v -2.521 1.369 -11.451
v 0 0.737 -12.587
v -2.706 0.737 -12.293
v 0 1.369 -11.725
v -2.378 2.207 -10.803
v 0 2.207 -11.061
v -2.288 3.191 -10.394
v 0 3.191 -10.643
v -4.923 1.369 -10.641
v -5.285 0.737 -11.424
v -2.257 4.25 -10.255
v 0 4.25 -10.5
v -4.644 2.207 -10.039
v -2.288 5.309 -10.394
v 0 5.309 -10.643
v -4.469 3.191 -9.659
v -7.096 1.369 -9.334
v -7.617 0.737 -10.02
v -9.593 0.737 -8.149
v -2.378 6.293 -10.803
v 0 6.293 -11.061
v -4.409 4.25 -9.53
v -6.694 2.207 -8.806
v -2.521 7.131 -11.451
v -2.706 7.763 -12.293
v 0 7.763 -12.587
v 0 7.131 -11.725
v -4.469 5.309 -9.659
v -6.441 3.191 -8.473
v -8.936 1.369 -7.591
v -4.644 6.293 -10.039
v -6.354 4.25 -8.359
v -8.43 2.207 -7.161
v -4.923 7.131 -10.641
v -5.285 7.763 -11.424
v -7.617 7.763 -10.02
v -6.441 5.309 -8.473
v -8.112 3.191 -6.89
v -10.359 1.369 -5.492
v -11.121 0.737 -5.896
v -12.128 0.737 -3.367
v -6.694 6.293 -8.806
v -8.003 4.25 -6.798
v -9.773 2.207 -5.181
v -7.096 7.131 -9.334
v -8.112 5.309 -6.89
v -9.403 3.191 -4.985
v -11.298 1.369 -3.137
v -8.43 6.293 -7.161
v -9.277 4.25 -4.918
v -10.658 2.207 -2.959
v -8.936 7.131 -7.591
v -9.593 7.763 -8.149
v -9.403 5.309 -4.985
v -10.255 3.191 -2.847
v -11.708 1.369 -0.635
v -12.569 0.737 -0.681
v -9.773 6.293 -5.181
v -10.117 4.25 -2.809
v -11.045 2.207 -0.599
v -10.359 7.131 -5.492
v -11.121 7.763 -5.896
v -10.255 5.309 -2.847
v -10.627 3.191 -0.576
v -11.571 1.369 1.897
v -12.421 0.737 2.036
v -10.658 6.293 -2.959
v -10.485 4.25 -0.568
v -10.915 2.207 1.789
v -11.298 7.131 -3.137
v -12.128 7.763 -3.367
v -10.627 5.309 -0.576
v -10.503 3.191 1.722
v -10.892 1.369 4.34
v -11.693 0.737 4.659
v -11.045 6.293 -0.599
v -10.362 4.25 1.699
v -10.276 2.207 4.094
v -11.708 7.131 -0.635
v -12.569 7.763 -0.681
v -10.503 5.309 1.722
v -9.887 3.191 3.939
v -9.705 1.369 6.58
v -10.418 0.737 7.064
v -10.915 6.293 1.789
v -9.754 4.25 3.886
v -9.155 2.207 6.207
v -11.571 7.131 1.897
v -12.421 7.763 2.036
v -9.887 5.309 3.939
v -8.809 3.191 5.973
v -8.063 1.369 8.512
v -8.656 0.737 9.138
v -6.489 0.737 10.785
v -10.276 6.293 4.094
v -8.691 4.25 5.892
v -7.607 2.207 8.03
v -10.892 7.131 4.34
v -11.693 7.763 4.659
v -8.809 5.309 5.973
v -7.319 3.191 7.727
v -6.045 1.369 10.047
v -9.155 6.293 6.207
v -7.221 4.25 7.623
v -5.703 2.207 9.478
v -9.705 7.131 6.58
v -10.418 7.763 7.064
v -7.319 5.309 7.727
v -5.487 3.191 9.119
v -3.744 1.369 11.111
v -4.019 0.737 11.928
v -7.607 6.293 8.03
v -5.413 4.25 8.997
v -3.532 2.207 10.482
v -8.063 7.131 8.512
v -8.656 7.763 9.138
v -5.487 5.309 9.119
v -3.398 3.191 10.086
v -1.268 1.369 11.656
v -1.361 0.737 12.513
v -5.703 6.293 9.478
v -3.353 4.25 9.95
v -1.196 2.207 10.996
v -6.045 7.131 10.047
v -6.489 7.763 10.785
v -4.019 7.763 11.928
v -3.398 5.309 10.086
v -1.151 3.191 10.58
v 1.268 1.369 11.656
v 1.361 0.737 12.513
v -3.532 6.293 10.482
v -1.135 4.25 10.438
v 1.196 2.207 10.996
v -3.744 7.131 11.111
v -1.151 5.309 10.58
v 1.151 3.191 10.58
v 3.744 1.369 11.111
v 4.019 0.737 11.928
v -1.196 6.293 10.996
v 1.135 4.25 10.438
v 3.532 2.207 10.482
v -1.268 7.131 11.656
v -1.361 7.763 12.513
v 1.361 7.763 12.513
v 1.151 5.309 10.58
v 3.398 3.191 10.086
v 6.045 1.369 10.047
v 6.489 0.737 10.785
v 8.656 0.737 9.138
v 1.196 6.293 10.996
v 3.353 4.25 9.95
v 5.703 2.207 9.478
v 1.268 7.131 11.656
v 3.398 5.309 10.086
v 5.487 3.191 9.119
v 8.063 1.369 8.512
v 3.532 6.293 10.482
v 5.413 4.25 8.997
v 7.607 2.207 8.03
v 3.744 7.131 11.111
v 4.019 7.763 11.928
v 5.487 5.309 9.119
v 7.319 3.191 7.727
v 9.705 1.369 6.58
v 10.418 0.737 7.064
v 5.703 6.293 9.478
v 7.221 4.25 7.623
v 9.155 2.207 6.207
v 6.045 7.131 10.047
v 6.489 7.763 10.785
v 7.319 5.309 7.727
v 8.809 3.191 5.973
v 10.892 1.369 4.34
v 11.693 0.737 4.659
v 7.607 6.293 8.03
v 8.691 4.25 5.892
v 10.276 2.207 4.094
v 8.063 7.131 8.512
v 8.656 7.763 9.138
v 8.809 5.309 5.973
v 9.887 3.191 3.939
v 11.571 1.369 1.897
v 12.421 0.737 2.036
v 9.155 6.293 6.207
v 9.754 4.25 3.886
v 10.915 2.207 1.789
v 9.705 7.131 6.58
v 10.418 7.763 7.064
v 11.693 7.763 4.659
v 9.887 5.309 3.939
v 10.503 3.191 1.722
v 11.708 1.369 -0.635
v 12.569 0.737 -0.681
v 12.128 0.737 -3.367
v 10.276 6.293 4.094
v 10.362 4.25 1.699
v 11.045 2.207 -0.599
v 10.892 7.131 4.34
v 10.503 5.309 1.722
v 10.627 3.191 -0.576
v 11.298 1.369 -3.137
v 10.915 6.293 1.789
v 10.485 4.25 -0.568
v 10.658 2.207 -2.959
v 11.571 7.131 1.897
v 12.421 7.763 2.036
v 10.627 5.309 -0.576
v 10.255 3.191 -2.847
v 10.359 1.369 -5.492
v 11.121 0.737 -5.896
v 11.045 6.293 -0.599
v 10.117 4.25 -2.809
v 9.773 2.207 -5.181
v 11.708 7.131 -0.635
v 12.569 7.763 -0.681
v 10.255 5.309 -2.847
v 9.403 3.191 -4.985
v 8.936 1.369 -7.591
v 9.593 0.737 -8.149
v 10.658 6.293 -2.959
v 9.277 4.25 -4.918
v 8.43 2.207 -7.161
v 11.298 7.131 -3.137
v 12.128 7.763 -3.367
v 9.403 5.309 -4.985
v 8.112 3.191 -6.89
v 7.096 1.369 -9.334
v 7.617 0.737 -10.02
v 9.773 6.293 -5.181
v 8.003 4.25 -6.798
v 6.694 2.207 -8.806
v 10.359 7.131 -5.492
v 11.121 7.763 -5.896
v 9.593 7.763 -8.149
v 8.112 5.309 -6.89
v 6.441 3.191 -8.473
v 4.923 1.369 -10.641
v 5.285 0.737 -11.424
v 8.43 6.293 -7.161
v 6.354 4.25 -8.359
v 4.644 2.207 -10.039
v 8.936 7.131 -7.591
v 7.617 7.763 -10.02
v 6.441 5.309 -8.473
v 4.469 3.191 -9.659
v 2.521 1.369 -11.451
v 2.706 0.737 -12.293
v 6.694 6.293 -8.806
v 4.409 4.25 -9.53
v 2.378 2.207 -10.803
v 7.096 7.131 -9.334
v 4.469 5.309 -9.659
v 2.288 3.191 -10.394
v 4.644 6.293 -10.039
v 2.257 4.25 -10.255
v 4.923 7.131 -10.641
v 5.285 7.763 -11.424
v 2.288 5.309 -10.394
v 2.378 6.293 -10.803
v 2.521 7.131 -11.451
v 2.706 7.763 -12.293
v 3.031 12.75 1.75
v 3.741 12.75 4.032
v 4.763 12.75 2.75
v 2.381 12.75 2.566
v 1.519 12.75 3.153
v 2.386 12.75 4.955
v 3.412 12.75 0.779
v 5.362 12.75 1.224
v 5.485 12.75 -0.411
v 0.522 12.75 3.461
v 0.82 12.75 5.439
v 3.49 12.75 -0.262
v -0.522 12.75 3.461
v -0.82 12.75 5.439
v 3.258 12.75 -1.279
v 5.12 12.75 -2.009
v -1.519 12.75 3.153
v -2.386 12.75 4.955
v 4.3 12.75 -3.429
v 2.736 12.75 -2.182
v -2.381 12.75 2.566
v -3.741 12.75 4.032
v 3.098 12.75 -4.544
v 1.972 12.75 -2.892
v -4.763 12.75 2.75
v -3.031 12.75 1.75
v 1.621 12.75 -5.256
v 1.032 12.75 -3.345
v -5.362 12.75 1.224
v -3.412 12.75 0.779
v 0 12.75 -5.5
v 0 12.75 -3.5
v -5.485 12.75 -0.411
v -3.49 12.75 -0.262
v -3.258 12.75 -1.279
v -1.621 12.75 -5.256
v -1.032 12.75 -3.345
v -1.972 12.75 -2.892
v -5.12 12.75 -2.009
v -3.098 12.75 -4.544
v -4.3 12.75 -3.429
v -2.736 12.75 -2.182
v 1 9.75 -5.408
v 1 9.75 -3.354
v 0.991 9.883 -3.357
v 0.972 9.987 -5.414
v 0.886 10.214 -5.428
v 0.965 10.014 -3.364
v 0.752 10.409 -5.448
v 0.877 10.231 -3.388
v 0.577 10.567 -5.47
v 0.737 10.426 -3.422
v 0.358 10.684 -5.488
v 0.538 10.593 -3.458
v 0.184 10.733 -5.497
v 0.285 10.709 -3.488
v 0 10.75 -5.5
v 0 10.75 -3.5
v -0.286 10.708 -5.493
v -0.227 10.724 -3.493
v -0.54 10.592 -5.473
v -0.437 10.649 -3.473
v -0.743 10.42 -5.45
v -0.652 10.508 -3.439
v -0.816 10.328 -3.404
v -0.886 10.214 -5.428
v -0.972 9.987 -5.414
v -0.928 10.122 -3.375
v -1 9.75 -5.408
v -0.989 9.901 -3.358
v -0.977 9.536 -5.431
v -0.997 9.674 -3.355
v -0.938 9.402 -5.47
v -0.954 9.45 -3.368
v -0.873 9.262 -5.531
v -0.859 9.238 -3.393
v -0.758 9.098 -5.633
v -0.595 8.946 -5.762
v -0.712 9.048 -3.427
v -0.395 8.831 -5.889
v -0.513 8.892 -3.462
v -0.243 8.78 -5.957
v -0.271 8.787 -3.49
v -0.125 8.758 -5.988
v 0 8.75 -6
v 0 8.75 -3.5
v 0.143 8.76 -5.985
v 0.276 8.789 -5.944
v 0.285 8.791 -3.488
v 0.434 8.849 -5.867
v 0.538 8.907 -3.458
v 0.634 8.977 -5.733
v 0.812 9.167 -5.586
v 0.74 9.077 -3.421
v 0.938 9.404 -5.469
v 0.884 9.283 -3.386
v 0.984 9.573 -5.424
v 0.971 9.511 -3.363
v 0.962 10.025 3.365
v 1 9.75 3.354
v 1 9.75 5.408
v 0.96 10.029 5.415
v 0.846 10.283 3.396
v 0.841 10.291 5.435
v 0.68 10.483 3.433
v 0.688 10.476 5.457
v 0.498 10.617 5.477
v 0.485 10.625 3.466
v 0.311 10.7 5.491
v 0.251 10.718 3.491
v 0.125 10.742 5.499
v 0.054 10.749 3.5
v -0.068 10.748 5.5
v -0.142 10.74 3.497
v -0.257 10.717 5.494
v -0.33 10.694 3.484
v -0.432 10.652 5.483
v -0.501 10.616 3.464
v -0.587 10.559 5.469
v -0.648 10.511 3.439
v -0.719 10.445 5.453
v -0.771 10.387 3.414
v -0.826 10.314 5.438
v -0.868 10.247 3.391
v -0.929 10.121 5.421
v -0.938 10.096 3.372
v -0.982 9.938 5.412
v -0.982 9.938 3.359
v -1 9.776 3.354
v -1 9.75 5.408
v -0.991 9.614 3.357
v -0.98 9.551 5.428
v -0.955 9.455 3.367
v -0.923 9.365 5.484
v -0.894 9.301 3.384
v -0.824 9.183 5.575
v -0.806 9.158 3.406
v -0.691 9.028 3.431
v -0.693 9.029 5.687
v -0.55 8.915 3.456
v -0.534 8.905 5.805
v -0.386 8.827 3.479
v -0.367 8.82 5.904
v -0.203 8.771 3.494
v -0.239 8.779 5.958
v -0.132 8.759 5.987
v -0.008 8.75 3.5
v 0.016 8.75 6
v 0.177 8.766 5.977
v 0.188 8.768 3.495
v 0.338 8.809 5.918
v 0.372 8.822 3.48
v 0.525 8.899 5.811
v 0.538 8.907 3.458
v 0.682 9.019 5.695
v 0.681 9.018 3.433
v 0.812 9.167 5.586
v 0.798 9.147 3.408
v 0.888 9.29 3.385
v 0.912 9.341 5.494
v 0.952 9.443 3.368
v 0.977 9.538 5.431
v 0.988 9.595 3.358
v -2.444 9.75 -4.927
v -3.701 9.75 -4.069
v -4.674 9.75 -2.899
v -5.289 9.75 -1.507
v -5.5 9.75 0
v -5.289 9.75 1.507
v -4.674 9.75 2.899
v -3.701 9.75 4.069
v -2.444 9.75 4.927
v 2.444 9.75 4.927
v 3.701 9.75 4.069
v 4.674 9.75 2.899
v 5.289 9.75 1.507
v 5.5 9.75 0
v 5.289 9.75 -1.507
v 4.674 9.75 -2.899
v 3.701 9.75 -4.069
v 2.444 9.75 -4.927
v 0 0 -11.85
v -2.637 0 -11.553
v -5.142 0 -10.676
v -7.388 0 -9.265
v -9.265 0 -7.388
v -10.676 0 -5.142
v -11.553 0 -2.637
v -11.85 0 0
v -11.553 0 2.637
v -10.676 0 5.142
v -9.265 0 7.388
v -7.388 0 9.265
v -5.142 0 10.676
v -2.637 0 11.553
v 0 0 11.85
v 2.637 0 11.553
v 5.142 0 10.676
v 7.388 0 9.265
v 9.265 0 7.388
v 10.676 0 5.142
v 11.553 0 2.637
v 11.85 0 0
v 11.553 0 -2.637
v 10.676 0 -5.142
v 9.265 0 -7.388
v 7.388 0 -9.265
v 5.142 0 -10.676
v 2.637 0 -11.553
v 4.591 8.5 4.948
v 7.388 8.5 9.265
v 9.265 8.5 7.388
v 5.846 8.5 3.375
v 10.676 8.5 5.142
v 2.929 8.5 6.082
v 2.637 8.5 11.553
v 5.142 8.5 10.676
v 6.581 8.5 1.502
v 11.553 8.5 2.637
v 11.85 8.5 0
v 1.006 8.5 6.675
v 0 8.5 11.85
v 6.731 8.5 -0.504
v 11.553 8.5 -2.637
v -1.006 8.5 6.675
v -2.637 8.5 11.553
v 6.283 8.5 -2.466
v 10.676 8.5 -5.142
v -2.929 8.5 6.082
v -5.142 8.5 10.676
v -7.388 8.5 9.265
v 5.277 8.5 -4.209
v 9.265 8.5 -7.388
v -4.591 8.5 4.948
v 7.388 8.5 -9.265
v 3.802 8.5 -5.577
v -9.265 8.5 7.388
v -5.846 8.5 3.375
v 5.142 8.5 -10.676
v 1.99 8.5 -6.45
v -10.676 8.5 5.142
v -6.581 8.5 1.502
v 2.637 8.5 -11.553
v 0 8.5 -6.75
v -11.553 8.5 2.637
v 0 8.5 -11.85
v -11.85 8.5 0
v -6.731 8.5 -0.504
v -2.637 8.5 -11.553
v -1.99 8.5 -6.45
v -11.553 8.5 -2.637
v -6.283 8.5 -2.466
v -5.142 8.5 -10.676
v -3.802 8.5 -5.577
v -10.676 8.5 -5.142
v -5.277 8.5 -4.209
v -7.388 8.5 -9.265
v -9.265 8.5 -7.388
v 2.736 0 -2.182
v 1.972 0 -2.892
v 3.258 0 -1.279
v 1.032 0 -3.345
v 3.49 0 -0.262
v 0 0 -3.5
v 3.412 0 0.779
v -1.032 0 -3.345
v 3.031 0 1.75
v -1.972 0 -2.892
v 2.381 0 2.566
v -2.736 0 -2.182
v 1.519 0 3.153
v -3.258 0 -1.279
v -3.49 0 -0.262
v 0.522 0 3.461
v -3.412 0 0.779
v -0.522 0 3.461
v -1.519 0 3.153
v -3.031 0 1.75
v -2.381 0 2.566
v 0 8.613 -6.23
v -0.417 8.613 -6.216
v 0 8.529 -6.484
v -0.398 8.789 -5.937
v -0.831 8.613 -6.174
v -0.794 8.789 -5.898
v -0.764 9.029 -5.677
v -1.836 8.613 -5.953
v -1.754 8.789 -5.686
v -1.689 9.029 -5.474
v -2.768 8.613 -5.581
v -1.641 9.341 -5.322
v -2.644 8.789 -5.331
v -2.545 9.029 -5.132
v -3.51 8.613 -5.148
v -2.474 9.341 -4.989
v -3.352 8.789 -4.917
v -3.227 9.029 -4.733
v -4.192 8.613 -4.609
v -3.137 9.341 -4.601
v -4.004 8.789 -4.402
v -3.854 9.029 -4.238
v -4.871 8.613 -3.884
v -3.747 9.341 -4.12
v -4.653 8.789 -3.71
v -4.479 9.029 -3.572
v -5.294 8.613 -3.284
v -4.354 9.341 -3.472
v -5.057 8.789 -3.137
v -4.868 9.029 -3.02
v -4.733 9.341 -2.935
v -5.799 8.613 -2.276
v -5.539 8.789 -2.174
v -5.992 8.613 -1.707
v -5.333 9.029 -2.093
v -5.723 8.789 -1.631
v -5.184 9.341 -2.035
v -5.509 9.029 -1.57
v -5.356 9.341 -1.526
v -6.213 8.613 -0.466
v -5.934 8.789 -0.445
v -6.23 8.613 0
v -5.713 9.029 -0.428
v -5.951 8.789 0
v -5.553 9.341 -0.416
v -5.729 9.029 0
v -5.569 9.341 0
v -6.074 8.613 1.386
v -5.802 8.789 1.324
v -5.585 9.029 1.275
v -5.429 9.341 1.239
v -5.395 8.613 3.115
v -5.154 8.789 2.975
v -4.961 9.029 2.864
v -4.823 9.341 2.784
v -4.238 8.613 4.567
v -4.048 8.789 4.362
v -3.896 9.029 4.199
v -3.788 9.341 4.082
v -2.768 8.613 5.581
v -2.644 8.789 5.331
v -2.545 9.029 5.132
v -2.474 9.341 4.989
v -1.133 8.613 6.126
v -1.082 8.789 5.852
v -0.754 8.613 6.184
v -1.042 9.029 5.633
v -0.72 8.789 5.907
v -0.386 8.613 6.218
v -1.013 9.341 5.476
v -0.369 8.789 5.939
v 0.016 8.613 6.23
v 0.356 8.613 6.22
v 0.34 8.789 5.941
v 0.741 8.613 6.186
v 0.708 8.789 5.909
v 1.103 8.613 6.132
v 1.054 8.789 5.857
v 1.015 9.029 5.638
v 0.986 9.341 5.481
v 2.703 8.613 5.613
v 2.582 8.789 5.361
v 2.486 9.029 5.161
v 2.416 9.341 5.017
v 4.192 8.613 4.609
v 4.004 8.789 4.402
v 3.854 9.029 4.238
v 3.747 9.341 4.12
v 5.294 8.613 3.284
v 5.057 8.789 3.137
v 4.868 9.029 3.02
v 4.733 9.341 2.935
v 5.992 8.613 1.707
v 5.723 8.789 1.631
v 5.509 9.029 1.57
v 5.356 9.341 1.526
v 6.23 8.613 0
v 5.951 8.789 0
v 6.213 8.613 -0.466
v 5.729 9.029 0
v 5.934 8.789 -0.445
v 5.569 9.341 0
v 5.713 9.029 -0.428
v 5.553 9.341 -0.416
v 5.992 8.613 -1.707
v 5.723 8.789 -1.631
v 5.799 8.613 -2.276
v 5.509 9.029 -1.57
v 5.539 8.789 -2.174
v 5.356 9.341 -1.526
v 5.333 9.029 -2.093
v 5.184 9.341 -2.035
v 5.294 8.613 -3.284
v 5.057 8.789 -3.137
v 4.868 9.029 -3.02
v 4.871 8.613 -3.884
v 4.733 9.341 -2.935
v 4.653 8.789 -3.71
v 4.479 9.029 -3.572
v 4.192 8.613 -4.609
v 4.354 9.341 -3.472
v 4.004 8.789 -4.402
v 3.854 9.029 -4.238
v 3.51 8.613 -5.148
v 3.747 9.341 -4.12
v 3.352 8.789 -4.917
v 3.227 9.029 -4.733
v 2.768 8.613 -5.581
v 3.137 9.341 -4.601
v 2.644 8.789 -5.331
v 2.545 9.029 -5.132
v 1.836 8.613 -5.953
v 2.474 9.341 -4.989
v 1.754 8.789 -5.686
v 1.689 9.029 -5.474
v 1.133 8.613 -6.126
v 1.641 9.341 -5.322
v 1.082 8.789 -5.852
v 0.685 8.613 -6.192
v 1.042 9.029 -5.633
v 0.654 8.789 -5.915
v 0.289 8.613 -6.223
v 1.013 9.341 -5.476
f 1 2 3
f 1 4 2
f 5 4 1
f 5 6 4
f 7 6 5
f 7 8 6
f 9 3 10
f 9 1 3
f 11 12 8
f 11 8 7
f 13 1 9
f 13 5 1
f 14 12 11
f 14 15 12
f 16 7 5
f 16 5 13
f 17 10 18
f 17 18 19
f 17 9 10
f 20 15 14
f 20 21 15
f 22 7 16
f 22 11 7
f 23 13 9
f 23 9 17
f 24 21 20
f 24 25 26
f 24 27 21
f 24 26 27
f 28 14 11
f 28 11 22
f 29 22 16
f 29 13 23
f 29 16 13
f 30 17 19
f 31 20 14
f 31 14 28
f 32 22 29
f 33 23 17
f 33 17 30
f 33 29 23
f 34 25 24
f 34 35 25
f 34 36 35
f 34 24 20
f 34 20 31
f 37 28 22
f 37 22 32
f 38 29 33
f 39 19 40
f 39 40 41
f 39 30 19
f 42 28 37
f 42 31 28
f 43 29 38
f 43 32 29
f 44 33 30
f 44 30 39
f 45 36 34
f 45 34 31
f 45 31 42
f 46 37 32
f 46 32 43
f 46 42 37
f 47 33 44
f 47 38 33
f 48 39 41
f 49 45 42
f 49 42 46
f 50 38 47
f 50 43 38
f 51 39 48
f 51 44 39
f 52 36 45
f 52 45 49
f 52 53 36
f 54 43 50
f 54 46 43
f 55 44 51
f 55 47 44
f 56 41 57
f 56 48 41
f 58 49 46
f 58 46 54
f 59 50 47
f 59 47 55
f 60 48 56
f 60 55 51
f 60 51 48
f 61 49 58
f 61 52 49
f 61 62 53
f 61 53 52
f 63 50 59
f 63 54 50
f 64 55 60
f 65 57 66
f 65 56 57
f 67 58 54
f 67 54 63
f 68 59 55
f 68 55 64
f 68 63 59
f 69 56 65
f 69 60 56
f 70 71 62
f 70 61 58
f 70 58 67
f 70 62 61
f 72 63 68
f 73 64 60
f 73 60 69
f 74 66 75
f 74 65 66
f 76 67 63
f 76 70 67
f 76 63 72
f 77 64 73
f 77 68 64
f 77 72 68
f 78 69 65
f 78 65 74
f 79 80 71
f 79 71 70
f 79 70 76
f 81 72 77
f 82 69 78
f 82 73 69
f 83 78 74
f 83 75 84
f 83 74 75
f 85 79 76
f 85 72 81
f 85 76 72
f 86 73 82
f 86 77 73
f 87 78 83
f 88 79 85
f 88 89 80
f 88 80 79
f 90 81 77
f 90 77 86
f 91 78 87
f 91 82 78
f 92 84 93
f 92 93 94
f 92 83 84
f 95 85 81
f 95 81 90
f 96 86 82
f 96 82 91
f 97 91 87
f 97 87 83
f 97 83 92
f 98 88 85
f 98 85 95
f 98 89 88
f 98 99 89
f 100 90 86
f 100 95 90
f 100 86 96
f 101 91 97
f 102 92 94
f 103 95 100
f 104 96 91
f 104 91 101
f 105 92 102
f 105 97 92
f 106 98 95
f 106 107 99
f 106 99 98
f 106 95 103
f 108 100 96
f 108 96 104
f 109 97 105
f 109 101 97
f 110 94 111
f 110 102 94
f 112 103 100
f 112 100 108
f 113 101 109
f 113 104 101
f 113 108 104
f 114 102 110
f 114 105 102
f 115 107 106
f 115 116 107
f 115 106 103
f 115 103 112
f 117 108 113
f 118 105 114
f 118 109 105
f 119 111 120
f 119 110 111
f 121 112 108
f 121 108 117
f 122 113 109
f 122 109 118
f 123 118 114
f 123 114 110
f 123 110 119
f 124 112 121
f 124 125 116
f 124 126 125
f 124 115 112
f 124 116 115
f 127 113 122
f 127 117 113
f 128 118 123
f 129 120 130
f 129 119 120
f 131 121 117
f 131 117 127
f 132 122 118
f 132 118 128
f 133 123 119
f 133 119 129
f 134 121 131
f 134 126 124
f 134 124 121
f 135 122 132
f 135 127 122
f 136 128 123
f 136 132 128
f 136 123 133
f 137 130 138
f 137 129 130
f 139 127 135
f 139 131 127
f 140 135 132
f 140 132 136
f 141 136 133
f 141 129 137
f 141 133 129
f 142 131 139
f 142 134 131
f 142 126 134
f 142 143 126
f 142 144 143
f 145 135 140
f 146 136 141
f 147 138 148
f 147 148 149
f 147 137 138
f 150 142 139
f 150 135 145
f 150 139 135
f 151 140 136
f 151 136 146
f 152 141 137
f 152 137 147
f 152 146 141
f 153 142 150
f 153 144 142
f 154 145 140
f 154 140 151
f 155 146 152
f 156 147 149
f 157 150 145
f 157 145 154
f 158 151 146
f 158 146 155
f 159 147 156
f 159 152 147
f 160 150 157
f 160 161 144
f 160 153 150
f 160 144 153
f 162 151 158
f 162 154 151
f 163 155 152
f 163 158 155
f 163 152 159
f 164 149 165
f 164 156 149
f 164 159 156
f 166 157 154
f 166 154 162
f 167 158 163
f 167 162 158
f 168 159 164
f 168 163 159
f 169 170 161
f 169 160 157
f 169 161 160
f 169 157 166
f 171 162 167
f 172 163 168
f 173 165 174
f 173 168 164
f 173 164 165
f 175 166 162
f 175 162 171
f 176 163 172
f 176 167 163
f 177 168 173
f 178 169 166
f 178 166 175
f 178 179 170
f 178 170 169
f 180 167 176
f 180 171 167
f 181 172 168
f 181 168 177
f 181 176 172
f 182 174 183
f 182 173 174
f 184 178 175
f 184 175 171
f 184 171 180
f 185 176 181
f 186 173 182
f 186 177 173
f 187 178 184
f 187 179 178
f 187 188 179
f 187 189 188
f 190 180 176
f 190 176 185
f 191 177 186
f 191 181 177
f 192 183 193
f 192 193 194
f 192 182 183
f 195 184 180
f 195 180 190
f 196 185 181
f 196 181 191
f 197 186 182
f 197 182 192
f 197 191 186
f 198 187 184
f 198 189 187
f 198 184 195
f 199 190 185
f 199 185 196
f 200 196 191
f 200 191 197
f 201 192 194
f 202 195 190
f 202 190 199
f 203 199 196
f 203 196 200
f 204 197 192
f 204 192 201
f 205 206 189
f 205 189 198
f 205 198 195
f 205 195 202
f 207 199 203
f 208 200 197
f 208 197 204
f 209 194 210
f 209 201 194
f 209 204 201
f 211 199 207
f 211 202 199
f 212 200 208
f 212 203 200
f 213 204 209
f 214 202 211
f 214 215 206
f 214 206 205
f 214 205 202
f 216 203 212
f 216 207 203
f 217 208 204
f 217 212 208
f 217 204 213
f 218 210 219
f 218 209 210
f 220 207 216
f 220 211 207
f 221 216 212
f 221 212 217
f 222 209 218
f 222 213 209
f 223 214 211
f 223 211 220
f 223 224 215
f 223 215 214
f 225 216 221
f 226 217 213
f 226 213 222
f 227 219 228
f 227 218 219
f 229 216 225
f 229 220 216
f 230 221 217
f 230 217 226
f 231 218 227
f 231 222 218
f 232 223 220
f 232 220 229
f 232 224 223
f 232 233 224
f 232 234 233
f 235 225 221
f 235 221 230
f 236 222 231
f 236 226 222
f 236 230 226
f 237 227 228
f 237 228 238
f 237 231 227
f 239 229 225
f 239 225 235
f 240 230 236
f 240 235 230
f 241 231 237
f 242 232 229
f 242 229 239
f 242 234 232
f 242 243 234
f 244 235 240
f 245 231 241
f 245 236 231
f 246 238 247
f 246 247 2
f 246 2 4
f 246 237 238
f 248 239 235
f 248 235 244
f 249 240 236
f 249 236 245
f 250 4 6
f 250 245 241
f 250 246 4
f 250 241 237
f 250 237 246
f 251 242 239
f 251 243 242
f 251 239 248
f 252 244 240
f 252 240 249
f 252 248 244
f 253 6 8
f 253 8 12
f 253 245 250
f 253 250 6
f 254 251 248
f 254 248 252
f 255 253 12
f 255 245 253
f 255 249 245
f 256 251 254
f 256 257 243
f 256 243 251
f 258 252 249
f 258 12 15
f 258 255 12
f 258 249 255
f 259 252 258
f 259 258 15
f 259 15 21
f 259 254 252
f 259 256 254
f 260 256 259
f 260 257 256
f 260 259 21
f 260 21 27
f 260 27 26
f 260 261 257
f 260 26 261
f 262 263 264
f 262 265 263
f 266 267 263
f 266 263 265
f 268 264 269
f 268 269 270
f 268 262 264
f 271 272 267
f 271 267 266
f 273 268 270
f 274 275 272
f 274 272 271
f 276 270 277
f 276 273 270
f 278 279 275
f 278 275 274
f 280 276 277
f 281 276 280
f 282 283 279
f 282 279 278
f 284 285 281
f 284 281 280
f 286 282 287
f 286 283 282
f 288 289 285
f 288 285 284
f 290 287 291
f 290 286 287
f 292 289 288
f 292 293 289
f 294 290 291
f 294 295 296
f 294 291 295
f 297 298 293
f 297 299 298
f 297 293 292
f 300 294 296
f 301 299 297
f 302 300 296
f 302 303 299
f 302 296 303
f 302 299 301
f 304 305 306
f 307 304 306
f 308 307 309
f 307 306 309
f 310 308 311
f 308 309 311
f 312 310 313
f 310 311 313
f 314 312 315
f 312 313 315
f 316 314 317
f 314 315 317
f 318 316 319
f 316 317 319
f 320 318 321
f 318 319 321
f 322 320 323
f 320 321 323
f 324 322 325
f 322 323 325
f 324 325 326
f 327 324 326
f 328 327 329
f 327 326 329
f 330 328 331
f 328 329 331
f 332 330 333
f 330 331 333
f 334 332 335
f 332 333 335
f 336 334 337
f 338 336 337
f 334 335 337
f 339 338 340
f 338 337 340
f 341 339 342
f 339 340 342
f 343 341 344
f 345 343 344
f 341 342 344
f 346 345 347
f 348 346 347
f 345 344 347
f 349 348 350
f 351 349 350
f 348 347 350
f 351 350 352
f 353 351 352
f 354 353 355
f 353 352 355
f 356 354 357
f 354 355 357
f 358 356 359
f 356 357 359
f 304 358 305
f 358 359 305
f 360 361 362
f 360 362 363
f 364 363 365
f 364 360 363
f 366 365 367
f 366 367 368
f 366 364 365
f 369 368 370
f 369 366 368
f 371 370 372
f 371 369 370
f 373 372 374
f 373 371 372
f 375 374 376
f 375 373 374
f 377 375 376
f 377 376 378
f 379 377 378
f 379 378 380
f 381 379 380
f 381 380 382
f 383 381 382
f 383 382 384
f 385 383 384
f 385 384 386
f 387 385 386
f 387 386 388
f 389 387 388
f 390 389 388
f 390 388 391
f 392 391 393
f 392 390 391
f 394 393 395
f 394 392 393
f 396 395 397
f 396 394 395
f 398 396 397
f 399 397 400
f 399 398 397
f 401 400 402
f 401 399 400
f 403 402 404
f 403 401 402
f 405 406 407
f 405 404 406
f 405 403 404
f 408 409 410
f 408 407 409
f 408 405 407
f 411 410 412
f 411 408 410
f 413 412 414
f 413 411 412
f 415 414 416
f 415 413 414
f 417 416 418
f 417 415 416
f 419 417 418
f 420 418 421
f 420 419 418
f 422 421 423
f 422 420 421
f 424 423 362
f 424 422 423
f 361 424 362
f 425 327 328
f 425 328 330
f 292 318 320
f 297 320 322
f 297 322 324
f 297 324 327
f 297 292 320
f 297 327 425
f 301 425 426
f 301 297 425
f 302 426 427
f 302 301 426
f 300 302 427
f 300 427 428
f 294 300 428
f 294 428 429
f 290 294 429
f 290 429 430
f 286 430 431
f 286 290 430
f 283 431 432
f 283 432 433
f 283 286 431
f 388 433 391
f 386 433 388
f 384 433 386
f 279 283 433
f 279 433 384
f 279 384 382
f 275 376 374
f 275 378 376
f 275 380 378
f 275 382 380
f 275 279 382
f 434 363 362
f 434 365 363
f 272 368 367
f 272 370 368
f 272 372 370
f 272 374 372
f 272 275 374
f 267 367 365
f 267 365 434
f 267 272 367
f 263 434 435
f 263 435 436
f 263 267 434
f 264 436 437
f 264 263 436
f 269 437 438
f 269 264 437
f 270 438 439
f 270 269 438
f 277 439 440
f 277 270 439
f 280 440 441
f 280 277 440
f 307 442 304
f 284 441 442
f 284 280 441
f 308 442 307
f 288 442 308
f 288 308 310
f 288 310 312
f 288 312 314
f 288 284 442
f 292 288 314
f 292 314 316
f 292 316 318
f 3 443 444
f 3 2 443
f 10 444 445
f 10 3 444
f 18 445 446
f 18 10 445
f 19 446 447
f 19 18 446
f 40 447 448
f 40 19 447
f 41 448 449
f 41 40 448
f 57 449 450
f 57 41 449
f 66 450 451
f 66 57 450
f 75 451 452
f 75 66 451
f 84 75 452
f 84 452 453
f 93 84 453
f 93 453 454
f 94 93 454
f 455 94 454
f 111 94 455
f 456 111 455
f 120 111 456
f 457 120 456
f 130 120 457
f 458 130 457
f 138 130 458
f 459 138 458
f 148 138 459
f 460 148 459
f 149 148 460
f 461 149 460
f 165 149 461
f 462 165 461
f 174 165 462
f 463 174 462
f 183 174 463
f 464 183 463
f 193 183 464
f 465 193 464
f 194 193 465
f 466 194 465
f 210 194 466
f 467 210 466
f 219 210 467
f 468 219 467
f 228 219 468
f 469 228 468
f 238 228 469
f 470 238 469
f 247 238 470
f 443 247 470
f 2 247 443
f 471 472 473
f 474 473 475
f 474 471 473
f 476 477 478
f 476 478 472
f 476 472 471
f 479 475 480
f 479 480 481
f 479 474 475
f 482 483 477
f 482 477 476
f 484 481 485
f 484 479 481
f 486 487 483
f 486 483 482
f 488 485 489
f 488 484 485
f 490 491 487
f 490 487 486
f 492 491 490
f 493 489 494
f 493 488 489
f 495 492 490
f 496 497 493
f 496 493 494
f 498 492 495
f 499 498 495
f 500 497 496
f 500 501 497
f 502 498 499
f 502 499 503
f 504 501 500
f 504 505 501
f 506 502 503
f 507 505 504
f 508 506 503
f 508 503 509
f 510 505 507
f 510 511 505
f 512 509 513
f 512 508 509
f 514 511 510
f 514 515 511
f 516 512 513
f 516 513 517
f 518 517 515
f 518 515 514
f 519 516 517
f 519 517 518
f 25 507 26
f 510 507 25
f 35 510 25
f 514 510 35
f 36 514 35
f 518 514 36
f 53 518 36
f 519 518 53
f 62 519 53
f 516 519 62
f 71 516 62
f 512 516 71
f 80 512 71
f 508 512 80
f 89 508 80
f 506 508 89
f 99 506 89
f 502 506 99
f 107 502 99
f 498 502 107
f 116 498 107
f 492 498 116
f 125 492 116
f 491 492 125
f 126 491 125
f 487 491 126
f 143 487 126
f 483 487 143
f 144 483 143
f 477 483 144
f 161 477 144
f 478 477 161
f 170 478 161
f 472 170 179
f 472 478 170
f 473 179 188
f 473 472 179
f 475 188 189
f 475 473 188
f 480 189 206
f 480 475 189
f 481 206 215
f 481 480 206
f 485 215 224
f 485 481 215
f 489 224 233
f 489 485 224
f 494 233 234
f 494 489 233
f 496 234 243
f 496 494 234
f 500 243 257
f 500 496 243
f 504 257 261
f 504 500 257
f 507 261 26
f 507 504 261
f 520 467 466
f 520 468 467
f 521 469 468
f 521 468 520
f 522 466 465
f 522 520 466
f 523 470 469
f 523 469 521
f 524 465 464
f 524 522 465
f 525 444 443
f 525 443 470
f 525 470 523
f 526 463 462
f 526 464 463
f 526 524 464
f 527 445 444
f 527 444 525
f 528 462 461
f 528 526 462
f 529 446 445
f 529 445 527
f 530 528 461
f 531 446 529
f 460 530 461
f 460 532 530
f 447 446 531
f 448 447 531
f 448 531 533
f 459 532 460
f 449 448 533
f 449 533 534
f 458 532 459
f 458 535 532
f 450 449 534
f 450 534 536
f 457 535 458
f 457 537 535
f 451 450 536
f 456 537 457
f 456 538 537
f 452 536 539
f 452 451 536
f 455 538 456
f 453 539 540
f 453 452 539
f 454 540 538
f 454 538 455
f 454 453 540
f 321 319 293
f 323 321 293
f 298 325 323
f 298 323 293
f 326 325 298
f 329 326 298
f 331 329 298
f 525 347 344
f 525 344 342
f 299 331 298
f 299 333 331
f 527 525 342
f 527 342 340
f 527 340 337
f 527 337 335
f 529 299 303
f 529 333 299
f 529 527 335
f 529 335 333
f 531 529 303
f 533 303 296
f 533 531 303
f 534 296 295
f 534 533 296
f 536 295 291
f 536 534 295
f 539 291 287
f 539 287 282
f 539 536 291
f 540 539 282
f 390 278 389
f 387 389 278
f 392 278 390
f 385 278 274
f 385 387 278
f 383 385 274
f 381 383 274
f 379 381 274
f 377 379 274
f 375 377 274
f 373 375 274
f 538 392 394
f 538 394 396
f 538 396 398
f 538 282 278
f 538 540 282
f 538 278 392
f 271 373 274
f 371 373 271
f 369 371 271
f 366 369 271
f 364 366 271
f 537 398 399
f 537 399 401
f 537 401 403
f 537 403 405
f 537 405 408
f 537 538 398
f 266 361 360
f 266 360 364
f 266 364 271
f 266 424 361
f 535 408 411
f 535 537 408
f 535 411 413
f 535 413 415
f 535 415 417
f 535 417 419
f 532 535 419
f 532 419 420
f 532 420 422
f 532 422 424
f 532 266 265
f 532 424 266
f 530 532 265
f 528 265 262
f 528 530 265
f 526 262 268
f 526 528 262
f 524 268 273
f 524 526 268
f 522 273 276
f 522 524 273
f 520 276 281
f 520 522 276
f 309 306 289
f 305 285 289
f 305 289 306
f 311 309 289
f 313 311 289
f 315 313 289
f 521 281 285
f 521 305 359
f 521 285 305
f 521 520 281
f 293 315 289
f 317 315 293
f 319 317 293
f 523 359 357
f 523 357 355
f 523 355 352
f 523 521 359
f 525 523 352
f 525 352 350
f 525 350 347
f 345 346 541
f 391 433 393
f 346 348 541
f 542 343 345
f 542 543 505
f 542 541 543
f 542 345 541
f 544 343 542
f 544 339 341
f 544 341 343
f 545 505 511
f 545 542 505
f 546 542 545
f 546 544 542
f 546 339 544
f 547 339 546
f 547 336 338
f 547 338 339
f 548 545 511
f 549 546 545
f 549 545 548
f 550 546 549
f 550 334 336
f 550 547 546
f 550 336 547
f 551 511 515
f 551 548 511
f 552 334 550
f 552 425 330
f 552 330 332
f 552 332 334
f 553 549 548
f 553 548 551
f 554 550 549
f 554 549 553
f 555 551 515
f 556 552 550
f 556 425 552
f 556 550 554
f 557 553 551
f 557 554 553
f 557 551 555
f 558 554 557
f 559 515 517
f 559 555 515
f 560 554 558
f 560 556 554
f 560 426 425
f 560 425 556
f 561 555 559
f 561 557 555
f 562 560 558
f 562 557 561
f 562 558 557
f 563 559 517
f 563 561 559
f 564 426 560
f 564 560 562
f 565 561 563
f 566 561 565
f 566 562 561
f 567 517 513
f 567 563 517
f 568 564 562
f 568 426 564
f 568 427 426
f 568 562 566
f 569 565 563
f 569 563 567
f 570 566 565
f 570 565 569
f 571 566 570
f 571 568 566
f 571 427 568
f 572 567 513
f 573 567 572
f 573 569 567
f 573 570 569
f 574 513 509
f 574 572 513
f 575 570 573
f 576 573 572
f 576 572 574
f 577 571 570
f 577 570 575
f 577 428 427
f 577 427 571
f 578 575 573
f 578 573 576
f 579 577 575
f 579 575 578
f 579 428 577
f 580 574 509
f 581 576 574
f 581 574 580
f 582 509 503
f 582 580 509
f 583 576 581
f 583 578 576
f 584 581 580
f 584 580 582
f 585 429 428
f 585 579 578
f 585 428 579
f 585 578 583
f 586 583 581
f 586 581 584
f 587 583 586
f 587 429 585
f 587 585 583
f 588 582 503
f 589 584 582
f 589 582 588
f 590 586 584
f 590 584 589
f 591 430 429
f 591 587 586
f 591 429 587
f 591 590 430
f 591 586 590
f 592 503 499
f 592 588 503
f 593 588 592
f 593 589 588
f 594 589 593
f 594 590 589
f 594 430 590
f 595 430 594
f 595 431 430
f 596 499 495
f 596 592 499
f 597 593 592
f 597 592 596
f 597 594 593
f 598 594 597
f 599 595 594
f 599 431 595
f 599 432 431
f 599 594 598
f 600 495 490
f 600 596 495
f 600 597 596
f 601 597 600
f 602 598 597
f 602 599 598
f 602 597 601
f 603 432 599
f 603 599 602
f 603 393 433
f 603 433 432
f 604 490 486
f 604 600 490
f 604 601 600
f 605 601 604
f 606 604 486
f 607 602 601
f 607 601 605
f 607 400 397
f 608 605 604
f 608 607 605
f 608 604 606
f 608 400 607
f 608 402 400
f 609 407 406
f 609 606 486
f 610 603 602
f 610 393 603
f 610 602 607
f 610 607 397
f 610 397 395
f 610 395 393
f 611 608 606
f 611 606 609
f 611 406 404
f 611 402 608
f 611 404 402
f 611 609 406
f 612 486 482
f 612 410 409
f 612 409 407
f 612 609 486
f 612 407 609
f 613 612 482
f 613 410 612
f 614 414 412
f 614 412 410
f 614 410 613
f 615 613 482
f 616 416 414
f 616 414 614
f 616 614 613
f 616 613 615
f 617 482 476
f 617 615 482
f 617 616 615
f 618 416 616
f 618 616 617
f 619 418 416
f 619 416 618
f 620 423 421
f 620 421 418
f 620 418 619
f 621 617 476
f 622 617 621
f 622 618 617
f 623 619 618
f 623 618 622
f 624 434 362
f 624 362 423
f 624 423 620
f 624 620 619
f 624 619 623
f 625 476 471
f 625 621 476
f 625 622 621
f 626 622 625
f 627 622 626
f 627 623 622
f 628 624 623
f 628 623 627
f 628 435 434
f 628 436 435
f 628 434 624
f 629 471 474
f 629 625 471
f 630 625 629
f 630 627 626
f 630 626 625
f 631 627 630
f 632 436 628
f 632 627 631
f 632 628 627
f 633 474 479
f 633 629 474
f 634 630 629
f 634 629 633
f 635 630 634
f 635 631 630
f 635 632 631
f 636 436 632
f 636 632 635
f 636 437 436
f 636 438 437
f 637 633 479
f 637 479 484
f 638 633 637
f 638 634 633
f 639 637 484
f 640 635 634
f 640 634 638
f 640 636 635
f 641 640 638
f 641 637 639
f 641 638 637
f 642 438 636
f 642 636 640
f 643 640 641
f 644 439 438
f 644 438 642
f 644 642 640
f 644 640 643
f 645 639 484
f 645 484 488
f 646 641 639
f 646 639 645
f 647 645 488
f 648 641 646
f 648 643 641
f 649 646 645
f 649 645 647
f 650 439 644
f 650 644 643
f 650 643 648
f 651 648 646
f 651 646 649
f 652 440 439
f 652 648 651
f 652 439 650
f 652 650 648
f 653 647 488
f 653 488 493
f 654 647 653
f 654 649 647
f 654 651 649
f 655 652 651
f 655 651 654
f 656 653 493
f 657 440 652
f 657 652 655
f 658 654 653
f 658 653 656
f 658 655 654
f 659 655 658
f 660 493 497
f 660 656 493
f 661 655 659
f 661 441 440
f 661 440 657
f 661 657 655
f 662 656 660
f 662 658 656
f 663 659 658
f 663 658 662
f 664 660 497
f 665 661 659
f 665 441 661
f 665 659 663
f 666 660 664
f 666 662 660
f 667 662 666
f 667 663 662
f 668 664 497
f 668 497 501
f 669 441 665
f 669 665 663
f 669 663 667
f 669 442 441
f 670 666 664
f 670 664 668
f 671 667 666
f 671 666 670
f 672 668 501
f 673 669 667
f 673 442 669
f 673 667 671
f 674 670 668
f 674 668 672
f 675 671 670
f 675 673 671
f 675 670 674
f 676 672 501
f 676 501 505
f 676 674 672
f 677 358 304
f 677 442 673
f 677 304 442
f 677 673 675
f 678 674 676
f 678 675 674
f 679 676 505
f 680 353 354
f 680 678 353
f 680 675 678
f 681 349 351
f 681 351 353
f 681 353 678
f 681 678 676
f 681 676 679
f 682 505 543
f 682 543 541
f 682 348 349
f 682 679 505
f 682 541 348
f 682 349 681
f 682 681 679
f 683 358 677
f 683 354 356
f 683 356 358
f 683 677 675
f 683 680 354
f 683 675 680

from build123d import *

# Parameters (mm, degrees)
CUT_EXTRUDE1_REACH             = 23.896
SKETCH2_R                      = 1
CUT_EXTRUDE1_DIRECTION_2_REACH = 23.896


with BuildPart() as part:
    # Sketch1 → Revolve1 (revolve)
    with BuildSketch(Plane.XY, mode=Mode.PRIVATE) as revolve1_sk:
        with BuildLine():
            Line((3.5, 8.5), (3.5, 0))
            Line((3.5, 0), (11.85, 0))
            Line((11.85, 0), (12.587068007, 0.737068007))
            ThreePointArc((12.587068007, 0.737068007), (10.5, 4.25), (12.587068007, 7.762931993))
            Line((12.587068007, 7.762931993), (11.85, 8.5))
            Line((11.85, 8.5), (6.75, 8.5))
            ThreePointArc((6.75, 8.5), (5.866116524, 8.866116524), (5.5, 9.75))
            Line((5.5, 9.75), (5.5, 12.75))
            Line((5.5, 12.75), (3.5, 12.75))
            Line((3.5, 12.75), (3.5, 8.5))
        make_face()
    revolve(revolve1_sk.sketch.rotate(Axis((0, 0, 0), (0, 1, 0)), 90), axis=Axis((0, 0, 0), (0, 1, 0)))

    # Sketch2 → Cut-Extrude1 (cut, up to next)
    with BuildSketch(Plane.XY, mode=Mode.PRIVATE) as cut_extrude1_sk1:
        with Locations((0, 9.75)):
            Circle(SKETCH2_R)
    cut_extrude1_tool1 = extrude(cut_extrude1_sk1.sketch, amount=-CUT_EXTRUDE1_REACH, mode=Mode.PRIVATE) & part.part
    add(cut_extrude1_tool1.solids().sort_by_distance((0, 9.75, 0))[0], mode=Mode.SUBTRACT)

    # Sketch2 → Cut-Extrude1 direction 2 (cut, up to next)
    with BuildSketch(Plane.XY, mode=Mode.PRIVATE) as cut_extrude1_direction_2_sk1:
        with Locations((0, 9.75)):
            Circle(SKETCH2_R)
    cut_extrude1_direction_2_tool1 = extrude(cut_extrude1_direction_2_sk1.sketch, amount=CUT_EXTRUDE1_DIRECTION_2_REACH, mode=Mode.PRIVATE) & part.part
    add(cut_extrude1_direction_2_tool1.solids().sort_by_distance((0, 9.75, 0))[0], mode=Mode.SUBTRACT)


solid = part.part
